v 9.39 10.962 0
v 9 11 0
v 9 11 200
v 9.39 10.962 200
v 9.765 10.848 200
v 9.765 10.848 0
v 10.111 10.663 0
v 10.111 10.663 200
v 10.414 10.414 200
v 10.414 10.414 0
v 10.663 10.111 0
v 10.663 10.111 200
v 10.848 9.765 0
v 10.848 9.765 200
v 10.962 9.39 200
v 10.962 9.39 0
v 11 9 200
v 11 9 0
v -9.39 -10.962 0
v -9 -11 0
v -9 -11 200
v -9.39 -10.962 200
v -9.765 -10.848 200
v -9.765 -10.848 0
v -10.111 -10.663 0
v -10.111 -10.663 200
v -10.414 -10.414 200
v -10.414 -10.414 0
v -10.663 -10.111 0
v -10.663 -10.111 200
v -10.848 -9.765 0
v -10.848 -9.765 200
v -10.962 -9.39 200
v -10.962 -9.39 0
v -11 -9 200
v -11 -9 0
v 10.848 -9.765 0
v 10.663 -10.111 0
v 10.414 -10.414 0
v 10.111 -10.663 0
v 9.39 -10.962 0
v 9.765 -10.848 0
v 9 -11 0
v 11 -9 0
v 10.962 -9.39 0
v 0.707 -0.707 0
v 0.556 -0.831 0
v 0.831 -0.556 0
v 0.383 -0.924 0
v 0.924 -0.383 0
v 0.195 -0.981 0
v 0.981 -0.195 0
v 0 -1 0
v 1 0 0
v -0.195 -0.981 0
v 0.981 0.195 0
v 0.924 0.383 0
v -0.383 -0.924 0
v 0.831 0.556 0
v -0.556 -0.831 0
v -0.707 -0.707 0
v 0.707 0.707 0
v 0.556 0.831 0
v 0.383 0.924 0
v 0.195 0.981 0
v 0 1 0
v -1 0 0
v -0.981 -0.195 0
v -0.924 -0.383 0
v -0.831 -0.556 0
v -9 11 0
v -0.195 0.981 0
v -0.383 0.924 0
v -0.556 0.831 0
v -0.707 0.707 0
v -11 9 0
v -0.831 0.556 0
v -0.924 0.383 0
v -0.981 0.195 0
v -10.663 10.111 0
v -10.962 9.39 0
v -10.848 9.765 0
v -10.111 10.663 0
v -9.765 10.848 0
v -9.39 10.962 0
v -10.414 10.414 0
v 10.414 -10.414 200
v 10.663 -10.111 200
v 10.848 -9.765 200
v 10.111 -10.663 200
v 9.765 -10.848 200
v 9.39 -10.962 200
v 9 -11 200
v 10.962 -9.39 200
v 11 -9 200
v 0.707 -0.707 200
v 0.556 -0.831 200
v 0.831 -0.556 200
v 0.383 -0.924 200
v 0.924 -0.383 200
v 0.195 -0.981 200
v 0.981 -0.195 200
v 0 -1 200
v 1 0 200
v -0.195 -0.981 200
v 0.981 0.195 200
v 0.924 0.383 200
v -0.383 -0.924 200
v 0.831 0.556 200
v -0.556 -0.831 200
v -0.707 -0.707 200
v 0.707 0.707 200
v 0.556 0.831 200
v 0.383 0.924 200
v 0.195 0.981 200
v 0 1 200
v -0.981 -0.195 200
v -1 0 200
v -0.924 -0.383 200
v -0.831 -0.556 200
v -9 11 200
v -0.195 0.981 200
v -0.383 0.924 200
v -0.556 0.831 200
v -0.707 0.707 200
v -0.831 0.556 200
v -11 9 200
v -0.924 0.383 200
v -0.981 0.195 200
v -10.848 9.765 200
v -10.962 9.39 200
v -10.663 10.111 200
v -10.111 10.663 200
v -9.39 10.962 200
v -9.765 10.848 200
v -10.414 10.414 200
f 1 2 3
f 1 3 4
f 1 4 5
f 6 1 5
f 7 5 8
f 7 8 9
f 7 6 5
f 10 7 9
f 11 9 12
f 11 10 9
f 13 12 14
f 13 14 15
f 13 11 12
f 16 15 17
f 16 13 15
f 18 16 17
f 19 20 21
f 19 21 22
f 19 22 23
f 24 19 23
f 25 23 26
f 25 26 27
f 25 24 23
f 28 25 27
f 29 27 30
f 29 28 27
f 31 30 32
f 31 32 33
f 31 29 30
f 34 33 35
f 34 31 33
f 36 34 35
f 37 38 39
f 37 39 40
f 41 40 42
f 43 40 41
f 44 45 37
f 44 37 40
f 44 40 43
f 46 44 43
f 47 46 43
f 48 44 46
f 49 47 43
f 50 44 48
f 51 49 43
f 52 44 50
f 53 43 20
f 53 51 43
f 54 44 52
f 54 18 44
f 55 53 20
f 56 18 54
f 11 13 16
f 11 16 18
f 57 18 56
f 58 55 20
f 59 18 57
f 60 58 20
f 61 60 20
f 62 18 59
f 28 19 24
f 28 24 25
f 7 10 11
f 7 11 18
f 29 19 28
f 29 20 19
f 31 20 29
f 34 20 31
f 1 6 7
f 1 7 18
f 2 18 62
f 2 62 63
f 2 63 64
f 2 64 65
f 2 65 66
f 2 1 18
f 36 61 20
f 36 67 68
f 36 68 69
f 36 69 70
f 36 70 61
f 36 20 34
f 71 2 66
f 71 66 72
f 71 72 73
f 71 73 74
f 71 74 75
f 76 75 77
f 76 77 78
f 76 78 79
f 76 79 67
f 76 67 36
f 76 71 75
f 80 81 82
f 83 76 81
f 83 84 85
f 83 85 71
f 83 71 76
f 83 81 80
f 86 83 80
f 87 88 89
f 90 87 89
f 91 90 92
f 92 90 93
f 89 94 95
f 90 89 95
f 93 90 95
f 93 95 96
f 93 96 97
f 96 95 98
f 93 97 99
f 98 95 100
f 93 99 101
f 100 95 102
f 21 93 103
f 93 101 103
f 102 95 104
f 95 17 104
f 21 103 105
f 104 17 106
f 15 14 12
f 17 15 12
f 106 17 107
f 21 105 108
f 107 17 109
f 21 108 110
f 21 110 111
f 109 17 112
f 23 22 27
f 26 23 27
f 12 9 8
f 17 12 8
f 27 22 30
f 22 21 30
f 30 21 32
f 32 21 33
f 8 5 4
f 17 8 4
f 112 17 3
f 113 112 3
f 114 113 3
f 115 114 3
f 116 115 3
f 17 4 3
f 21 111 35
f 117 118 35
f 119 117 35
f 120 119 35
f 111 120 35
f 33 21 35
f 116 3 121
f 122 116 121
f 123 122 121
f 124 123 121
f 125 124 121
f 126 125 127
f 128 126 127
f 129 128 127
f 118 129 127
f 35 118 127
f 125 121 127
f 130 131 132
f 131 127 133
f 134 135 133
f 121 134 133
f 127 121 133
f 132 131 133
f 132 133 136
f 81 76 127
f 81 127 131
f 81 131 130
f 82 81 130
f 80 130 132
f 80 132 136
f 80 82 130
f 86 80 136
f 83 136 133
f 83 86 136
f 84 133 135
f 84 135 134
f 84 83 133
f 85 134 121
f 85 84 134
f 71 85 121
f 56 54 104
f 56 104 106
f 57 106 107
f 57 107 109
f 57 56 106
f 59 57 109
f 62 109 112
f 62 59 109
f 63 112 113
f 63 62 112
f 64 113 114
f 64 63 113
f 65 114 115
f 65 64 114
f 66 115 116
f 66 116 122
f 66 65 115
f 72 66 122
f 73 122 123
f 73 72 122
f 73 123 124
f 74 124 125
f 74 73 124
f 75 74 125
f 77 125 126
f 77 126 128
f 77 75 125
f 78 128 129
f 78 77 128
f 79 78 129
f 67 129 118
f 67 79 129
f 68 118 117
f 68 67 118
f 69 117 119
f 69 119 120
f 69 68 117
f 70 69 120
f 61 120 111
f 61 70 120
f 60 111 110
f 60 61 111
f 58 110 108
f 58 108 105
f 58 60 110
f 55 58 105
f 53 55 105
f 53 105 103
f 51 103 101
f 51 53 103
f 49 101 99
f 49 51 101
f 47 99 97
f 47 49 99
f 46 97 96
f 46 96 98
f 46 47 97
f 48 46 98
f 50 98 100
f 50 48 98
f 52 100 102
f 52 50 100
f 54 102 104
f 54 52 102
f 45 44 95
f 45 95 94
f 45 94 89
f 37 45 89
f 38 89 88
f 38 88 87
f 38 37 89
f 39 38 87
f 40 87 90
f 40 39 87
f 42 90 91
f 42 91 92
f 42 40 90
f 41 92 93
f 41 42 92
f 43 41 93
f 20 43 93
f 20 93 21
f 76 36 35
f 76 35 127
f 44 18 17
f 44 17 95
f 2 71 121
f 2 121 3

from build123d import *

# Parameters (mm, degrees)
ESQUISSE1_R      = 1
EXTRUSION1_DEPTH = 200


with BuildPart() as part:
    # Esquisse1 → Extrusion1 (new body)
    with BuildSketch(Plane.XY):
        with BuildLine():
            Line((-9, 11), (9, 11))
            ThreePointArc((9, 11), (10.414213562, 10.414213562), (11, 9))
            Line((11, 9), (11, -9))
            ThreePointArc((11, -9), (10.414213562, -10.414213562), (9, -11))
            Line((9, -11), (-9, -11))
            ThreePointArc((-9, -11), (-10.414213562, -10.414213562), (-11, -9))
            Line((-11, -9), (-11, 9))
            ThreePointArc((-11, 9), (-10.414213562, 10.414213562), (-9, 11))
        make_face()
        Circle(ESQUISSE1_R, mode=Mode.SUBTRACT)
    extrude(amount=EXTRUSION1_DEPTH)


solid = part.part
